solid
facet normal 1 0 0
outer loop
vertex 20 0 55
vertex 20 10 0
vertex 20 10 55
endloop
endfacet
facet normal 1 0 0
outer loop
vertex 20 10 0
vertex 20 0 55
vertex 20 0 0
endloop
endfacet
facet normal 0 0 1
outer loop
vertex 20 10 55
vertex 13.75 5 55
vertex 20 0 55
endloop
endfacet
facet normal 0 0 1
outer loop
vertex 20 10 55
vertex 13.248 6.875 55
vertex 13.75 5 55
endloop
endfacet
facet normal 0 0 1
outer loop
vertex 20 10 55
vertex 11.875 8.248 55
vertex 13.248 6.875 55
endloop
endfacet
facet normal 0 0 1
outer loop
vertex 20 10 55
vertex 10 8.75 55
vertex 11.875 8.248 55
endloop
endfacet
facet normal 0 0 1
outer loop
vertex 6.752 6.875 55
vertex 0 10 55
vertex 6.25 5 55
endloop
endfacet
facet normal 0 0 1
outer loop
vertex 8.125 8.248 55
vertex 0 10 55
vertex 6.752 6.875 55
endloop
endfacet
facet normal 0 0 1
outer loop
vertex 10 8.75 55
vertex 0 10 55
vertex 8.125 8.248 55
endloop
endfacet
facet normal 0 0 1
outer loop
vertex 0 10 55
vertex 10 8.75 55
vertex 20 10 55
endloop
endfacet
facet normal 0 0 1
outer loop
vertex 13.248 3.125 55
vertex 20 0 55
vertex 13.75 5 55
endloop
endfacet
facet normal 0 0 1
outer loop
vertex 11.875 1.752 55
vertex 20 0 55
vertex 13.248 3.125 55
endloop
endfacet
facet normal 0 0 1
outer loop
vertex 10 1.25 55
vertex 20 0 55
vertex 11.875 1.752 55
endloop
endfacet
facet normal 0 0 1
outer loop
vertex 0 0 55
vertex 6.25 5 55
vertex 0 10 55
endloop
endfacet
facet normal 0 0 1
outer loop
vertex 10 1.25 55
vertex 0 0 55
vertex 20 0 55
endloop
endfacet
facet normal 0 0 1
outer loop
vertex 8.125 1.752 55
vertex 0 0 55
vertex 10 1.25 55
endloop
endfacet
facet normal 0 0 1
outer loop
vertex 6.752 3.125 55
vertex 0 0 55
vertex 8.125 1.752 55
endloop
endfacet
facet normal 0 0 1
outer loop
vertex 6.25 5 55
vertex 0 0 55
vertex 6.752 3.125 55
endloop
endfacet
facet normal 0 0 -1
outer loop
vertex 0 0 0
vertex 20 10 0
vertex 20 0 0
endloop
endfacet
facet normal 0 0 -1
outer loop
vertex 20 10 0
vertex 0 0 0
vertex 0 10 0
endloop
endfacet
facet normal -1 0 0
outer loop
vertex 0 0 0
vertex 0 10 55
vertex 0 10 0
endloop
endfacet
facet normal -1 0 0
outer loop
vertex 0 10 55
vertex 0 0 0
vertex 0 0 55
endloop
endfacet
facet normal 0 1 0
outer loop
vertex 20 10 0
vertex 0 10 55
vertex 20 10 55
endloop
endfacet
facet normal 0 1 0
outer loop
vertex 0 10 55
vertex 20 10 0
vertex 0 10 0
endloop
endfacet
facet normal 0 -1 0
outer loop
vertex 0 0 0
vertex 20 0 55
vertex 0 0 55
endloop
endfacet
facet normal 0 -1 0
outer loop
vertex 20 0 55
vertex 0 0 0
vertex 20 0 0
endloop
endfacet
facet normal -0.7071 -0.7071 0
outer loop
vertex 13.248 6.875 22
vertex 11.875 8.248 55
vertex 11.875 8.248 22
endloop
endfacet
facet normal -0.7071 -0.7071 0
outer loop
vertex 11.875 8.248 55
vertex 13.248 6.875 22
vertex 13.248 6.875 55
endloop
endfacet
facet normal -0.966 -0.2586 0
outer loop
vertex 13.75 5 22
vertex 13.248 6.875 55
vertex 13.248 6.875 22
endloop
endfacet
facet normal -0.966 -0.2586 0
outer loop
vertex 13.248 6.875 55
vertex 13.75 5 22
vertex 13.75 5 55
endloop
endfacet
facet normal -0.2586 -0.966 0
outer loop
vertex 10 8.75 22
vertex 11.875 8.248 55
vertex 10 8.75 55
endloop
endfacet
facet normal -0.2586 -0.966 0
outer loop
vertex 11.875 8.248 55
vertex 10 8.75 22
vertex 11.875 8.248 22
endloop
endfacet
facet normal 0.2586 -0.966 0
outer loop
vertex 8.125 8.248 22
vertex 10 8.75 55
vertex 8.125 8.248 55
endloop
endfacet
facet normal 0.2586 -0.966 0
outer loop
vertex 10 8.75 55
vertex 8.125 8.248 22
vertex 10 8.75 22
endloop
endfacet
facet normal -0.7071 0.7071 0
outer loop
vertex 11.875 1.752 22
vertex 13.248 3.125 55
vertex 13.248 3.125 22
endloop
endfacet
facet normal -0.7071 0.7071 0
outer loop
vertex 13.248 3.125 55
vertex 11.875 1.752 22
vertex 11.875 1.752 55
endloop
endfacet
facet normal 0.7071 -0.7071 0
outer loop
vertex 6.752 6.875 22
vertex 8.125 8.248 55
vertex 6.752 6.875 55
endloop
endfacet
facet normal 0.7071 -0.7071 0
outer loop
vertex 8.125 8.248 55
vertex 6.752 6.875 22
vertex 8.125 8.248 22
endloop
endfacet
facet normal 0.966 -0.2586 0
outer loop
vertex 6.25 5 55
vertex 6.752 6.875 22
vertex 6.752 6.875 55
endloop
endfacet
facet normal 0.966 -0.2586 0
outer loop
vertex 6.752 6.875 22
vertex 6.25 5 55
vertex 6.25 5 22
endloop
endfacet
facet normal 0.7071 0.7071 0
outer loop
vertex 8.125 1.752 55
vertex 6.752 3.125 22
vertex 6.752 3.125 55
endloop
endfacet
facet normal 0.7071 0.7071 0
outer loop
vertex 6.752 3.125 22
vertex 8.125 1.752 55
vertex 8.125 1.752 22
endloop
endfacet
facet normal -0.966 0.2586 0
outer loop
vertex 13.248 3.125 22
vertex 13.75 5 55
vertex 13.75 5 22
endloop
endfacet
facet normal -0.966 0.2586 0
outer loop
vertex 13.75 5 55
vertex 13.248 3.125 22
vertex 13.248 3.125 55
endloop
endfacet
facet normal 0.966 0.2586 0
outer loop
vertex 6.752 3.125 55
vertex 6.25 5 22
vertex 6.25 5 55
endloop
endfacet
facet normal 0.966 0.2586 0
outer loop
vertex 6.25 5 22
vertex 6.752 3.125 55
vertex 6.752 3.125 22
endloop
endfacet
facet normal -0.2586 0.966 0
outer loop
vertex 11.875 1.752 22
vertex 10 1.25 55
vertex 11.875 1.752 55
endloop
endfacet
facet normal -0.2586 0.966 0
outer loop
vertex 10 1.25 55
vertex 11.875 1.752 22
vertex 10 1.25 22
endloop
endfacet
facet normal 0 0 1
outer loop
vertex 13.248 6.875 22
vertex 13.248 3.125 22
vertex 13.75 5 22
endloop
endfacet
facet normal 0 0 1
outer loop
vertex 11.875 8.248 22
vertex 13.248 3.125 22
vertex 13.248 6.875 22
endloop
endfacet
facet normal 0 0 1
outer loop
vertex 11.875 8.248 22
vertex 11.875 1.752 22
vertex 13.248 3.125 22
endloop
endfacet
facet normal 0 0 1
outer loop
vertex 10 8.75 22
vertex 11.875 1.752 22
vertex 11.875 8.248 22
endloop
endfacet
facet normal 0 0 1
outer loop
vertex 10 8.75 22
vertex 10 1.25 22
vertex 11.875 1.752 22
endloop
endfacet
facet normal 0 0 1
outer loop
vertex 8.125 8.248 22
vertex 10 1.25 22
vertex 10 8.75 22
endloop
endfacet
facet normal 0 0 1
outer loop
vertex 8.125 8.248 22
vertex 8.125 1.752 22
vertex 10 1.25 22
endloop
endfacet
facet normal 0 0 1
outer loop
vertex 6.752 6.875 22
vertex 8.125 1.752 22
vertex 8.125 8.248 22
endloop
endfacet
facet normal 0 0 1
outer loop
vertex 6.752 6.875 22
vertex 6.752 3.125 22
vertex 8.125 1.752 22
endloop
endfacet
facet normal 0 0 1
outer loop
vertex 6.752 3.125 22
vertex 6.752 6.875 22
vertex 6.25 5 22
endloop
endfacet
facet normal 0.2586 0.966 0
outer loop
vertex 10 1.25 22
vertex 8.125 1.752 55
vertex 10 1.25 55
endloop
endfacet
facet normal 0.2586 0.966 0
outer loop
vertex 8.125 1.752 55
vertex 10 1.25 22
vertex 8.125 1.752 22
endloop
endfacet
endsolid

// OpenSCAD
difference()
{
	cube([20,10,55]);
	translate([10,5,22]) cylinder(h=35,d=7.5);
}
